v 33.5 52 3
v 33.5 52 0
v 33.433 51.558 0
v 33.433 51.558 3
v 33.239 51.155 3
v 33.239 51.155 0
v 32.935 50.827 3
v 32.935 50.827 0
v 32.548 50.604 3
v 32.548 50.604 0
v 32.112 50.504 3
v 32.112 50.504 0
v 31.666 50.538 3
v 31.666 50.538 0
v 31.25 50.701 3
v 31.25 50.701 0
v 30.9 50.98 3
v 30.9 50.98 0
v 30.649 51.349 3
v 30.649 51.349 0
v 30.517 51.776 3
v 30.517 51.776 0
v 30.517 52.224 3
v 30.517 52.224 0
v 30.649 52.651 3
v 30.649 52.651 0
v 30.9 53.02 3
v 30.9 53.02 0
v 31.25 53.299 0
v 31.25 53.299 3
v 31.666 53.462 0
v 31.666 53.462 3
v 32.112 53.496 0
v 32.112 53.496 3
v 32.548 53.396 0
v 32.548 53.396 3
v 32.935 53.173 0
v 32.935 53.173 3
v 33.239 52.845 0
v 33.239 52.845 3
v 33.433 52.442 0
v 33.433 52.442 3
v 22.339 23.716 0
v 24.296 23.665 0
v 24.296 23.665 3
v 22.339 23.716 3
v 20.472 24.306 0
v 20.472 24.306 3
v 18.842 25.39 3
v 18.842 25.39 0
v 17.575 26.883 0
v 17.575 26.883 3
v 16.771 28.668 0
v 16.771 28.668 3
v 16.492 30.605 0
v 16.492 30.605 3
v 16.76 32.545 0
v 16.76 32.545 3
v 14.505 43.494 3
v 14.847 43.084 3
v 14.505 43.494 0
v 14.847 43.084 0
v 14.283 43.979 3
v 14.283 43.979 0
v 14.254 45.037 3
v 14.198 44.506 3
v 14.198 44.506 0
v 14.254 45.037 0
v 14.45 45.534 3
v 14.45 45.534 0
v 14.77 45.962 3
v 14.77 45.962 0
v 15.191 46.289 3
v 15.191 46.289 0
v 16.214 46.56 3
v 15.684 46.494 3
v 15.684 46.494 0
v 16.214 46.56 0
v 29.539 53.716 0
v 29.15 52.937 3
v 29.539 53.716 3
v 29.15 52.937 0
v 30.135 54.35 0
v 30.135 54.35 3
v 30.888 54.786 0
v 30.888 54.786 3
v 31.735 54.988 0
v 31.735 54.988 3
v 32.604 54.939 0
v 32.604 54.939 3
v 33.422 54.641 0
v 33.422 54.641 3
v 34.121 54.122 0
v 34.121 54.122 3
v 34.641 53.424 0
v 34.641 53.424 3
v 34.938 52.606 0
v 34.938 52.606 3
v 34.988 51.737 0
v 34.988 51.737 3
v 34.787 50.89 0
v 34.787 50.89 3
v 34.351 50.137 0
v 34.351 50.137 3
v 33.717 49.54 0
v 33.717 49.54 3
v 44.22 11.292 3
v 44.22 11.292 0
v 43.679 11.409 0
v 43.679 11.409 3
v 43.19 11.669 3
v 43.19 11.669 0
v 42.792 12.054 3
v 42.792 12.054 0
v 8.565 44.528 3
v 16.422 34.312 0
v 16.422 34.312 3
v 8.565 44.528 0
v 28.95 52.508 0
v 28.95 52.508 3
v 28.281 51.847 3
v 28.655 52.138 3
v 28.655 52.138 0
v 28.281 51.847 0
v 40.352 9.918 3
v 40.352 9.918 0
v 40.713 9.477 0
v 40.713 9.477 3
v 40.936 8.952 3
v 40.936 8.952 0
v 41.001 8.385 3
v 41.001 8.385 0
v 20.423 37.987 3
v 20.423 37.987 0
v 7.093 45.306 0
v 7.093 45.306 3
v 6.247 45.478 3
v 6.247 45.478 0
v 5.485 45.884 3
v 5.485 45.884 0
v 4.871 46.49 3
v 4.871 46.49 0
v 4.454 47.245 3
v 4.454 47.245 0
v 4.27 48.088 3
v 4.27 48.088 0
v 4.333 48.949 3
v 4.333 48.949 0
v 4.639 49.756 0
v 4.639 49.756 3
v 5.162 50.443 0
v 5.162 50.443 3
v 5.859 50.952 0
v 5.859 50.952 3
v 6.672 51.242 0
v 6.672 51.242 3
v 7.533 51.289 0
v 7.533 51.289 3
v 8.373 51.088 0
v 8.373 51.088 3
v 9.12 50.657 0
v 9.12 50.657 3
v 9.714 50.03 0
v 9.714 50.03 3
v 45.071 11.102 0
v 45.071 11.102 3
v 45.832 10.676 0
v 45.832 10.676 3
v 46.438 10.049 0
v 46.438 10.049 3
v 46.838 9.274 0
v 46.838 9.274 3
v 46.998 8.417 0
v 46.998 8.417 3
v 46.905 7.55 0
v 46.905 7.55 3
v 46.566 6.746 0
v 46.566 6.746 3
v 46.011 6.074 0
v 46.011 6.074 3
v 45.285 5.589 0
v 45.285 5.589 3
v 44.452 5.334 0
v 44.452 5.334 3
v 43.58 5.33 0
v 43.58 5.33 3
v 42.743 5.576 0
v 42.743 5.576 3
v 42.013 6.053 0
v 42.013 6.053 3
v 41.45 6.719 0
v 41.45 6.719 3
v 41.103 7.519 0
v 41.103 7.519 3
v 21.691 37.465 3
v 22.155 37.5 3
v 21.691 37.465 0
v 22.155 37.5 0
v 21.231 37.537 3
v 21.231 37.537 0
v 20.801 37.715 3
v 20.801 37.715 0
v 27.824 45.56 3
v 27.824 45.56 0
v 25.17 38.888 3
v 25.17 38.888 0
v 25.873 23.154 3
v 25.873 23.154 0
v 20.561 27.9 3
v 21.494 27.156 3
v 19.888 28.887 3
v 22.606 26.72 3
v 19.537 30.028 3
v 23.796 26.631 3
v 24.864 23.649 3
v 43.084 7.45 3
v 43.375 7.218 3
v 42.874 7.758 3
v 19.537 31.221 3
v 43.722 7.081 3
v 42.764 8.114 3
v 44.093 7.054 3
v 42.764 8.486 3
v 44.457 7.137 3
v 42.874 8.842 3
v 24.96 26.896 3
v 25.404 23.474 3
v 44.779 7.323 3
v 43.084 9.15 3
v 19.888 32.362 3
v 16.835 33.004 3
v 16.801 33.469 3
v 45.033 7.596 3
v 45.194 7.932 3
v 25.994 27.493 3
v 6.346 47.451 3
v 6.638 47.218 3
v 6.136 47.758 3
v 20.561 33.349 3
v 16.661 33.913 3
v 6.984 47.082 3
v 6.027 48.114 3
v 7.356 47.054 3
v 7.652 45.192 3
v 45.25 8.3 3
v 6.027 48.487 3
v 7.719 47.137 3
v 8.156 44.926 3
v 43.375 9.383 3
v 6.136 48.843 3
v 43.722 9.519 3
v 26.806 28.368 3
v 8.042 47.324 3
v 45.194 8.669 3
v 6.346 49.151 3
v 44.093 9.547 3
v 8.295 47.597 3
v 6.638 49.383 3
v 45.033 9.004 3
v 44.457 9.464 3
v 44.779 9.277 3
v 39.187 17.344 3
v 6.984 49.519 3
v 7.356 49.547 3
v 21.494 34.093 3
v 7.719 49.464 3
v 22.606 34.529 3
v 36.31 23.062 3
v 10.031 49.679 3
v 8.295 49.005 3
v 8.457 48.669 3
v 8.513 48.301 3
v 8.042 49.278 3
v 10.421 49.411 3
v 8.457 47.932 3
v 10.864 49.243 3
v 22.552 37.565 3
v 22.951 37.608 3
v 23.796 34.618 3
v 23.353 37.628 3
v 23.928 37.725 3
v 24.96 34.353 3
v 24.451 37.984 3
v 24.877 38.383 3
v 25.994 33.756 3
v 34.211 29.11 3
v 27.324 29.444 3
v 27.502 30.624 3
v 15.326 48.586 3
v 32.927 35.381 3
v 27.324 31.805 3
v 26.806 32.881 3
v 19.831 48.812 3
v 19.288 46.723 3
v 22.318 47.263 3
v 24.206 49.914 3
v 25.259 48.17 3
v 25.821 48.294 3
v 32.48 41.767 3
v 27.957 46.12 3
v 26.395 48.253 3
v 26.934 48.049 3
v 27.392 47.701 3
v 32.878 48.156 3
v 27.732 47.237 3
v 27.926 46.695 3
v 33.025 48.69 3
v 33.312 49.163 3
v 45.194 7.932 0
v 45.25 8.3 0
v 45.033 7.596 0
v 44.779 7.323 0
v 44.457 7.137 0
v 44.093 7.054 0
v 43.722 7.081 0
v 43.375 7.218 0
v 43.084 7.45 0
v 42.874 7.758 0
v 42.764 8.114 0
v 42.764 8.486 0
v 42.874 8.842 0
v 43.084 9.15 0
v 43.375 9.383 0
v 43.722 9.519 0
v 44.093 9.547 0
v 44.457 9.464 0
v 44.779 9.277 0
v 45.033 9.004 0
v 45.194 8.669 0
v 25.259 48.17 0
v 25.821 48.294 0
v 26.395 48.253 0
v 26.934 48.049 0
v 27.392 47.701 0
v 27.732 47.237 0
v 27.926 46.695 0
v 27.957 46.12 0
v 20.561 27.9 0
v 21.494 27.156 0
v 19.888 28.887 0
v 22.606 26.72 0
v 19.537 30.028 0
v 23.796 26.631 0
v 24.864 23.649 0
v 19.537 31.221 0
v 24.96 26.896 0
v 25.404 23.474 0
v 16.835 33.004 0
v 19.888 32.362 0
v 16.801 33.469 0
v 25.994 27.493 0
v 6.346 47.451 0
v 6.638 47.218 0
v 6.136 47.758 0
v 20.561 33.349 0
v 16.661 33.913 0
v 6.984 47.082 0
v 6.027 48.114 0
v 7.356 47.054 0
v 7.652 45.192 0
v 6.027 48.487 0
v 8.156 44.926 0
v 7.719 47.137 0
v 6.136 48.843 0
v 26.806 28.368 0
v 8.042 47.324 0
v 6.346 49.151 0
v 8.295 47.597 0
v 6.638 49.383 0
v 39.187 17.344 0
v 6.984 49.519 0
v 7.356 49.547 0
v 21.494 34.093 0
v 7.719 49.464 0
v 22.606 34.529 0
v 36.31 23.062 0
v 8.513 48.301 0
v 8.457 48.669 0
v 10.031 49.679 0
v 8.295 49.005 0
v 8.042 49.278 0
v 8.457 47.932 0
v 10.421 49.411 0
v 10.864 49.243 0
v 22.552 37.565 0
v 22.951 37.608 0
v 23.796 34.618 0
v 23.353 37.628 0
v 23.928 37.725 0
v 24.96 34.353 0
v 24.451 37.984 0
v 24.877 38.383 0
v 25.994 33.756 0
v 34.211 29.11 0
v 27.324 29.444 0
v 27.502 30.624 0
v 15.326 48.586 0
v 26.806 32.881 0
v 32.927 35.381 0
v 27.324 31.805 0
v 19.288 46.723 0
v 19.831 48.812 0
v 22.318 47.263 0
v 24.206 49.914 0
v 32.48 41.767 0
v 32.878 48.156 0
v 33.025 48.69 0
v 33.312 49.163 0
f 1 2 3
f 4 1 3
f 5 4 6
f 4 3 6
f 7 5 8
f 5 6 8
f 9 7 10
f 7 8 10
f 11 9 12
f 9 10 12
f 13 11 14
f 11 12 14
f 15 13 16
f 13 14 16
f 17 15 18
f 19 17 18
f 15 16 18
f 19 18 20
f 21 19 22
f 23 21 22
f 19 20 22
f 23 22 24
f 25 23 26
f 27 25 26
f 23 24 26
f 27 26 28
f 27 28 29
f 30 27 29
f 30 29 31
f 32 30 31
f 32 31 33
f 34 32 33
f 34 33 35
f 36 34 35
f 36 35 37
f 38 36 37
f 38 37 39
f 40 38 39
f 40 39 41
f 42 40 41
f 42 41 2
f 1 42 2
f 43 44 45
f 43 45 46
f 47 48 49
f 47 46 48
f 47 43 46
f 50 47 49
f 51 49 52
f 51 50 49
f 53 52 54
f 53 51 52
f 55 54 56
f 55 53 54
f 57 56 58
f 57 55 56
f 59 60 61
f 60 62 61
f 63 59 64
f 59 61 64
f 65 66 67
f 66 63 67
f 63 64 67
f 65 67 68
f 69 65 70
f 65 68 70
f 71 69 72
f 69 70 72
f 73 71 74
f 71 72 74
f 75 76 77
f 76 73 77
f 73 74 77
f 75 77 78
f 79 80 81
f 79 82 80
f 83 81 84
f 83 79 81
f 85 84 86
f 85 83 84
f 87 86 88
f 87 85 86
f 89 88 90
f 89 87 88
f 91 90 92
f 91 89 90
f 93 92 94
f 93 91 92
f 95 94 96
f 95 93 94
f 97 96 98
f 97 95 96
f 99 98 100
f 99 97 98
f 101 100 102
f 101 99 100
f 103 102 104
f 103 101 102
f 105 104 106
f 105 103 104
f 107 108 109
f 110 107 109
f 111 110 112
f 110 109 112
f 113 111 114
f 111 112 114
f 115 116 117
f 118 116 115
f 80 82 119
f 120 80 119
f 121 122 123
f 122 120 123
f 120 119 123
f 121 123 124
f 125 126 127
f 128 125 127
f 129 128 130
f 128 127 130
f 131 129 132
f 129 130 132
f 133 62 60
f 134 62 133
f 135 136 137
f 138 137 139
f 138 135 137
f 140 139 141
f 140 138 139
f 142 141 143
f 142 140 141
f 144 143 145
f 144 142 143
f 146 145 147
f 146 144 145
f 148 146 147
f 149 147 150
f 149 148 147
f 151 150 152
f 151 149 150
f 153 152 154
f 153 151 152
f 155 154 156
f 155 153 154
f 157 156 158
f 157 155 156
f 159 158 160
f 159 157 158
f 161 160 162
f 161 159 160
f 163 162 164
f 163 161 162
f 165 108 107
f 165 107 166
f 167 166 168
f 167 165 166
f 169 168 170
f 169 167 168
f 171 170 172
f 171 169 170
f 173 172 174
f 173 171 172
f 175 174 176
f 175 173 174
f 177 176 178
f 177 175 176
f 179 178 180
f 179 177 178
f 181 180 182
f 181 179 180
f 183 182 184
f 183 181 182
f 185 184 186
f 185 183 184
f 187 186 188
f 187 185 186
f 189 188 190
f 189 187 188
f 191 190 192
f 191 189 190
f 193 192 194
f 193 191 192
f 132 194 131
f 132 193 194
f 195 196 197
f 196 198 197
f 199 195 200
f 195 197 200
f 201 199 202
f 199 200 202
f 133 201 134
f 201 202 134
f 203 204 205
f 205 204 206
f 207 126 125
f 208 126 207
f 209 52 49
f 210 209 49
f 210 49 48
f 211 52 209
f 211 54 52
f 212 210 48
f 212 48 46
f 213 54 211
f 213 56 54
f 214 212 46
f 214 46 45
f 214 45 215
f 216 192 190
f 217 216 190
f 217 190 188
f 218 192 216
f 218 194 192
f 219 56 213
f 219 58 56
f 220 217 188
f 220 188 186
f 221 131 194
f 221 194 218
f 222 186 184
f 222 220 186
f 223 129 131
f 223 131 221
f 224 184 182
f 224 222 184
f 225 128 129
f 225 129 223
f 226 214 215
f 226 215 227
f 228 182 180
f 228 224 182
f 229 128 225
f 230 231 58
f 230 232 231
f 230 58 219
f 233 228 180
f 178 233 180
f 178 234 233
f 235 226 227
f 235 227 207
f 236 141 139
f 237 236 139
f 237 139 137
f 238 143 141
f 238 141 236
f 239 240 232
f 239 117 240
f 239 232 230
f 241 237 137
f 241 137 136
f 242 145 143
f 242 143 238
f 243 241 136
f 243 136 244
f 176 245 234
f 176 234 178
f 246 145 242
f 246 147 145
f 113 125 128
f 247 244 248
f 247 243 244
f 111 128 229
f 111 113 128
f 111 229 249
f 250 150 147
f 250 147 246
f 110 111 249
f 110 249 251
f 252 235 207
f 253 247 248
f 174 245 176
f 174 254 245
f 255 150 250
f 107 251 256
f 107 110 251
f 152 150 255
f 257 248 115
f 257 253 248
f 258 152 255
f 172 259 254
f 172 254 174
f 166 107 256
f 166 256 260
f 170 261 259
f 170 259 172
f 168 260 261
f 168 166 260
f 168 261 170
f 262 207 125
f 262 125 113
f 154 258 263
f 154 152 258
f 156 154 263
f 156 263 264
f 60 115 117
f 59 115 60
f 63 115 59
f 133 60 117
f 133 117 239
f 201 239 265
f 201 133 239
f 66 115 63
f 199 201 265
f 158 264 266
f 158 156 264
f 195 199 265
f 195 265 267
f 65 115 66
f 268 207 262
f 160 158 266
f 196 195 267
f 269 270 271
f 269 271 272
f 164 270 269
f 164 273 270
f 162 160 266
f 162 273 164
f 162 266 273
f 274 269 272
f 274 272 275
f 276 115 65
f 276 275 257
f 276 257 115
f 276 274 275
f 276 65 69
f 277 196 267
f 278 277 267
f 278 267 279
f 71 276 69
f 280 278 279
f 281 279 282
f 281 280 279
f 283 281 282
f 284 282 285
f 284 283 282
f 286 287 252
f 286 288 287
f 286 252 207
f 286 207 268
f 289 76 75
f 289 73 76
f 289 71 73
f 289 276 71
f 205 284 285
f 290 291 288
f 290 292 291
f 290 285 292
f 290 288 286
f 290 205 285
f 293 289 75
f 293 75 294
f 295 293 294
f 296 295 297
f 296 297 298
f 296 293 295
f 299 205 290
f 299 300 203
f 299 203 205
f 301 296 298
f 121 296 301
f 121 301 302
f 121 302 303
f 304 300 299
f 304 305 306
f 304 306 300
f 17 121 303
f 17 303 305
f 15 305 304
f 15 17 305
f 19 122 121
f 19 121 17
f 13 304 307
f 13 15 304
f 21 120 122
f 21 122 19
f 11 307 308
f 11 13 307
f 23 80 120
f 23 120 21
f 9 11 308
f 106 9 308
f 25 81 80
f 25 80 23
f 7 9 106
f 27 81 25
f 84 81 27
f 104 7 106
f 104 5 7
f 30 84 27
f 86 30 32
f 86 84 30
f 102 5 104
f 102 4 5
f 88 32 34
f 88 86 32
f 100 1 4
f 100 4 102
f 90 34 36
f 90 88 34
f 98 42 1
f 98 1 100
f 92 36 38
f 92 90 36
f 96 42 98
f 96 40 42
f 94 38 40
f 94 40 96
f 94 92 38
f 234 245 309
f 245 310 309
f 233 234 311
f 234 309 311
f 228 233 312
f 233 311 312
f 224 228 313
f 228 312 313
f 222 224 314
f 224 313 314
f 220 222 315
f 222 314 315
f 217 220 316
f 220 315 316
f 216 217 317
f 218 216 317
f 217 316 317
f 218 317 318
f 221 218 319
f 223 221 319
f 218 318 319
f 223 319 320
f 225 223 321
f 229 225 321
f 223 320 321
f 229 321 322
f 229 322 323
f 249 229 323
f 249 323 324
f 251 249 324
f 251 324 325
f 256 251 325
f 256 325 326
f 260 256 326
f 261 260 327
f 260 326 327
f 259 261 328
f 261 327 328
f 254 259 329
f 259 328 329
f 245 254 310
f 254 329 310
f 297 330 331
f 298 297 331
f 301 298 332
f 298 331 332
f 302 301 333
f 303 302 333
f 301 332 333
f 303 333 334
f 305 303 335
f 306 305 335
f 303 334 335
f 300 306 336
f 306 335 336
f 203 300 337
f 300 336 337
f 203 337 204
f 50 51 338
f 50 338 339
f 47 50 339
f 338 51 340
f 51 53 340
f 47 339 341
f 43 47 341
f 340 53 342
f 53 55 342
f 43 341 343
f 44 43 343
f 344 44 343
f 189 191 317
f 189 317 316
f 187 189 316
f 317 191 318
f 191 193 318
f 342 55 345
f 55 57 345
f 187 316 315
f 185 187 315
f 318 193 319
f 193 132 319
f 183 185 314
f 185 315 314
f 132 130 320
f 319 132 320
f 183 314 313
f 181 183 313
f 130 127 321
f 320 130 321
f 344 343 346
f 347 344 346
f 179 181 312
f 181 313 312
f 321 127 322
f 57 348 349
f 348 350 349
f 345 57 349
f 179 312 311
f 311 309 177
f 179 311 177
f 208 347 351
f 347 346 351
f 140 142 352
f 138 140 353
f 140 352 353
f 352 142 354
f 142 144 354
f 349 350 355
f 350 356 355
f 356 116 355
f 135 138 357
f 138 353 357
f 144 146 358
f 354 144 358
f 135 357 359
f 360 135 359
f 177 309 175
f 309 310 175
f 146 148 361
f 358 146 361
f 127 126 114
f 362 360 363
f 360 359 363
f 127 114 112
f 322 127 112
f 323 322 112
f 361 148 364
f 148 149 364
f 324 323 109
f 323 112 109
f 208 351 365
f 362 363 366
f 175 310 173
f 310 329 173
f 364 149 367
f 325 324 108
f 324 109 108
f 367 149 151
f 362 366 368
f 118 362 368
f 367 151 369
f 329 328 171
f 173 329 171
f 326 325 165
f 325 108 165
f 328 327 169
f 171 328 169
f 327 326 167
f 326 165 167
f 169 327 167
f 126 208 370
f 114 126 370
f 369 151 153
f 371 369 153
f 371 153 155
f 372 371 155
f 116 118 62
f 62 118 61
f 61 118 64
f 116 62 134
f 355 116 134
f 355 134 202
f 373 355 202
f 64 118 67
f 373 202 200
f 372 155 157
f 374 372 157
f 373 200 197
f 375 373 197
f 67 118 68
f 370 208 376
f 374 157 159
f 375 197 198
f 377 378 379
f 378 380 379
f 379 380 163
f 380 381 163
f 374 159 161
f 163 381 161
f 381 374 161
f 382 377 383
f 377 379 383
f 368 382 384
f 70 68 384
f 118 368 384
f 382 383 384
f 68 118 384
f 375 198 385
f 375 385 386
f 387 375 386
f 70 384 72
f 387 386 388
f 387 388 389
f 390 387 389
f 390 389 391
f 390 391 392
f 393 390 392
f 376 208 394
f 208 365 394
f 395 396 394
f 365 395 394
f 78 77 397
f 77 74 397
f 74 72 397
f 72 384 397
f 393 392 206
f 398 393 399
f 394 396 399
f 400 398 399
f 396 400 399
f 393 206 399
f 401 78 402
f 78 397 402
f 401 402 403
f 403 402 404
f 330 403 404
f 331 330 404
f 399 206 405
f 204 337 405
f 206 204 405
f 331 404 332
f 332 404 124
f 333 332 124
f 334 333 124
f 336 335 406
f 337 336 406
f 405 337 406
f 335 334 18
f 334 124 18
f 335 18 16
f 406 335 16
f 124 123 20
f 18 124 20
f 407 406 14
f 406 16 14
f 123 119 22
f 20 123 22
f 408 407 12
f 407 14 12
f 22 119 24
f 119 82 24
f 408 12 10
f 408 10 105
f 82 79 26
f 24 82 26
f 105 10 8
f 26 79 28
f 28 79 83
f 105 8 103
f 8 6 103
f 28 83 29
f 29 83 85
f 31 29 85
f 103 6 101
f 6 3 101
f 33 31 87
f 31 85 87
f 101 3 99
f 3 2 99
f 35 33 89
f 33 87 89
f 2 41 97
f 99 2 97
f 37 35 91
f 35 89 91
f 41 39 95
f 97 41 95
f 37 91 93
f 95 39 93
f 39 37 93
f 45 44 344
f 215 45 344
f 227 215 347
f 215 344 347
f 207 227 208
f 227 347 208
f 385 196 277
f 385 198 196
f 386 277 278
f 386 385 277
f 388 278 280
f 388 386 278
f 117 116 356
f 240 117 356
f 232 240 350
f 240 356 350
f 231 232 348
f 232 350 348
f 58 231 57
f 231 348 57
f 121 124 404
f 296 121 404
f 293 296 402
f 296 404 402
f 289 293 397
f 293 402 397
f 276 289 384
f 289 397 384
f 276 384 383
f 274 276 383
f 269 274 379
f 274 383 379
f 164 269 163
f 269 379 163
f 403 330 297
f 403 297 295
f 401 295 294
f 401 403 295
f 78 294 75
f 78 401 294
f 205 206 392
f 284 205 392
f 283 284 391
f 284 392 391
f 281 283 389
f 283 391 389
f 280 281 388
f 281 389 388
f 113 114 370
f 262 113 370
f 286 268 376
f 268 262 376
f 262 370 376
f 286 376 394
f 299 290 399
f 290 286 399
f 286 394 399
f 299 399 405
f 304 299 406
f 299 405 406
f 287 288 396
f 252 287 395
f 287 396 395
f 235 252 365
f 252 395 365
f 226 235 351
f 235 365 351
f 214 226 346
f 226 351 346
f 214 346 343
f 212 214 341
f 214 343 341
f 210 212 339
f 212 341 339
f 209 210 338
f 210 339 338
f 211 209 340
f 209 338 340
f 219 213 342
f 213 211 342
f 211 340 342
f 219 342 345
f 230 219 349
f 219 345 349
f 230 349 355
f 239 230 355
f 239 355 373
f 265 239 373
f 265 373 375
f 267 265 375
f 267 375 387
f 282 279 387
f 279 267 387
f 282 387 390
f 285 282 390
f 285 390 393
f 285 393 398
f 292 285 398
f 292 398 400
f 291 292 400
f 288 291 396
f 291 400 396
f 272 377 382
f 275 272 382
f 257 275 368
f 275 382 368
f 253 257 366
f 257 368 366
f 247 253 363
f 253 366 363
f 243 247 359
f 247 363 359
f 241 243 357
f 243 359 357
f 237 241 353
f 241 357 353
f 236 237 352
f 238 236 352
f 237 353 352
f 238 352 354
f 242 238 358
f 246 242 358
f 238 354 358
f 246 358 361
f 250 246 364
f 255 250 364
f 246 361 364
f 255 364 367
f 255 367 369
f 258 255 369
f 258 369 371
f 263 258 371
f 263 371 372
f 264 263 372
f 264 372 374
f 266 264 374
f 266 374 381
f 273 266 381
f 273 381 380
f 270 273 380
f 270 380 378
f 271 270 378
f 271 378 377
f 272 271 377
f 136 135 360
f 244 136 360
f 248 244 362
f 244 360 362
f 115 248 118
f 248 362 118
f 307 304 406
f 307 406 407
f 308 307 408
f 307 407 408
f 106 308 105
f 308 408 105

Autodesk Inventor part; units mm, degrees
ref_plane "YZ Plane" through (0, 0, 0) normal (1, 0, 0) x (0, 1, 0)
ref_plane "XZ Plane" through (0, 0, 0) normal (0, 1, 0) x (-1, 0, 0)
ref_plane "XY Plane" through (0, 0, 0) normal (0, 0, 1) x (1, 0, 0)
sketch "スケッチ1" plane through (0, 0, 0) normal (0, 0, 1) x (1, 0, 0)
  circle A0 centre (7.2626, 48.3008) radius 1.25
  circle A1 centre (23.4968, 30.6245) radius 4.005
  circle A2 centre (44, 8.3001) radius 1.25
  line L0 (10.1247, 47.4019) -> (21.2271, 37.2516)
  line L1 (17.0863, 33.4486) -> (7.9152, 45.3726)
  circle A3 centre (23.4968, 30.6245) radius 7.005
  line L2 (41.1378, 9.199) -> (25.1486, 23.817)
  line L3 (30.1394, 28.4007) -> (43.3474, 11.2282)
  circle A4 centre (7.2626, 48.3008) radius 3
  circle A5 centre (44, 8.3001) radius 3
  circle A6 centre (32, 52) radius 1.5
  circle A7 centre (32, 52) radius 3
  line L4 (32, 52) -> (23.4968, 30.6245)
  arc A8 (32, 52) -> (44, 8.3001) centre (80.98, 41.9524) ccw
  arc A9 (7.2626, 48.3008) -> (32, 52) centre (16.4298, 71.5594) ccw
  arc A10 (4.6243, 51.8203) -> (33.4933, 56.1374) centre (16.4298, 71.5594) ccw
  arc A11 (33.2535, 50.5793) -> (44.802, 9.6507) centre (80.98, 41.9524) ccw
  line L5 (33.3938, 51.4456) -> (24.8906, 30.0701)
  line L6 (30.6062, 52.5544) -> (22.103, 31.179)
  point P0 (0, 0)
  point P1 (0, 0)
  point P2 (43.4377, 11.2469)
  point P3 (33.0215, 49.1793)
  point P4 (29.0159, 52.3087)
  point P5 (10.0258, 49.4689)
  point P6 (10.1773, 47.3539)
  point P7 (29.545, 50.2758)
  point P8 (29.6459, 50.1404)
  point P9 (24.6322, 37.5369)
  point P10 (10.1146, 47.3701)
  point P11 (35.2275, 21.7854)
  point P12 (27.4198, 36.428)
  point P13 (31.1236, 45.7388)
  dimension "d0" = 2
  dimension "d1" = 1.5
  dimension "d2" = 1.5
  dimension "d3" = 1.5
  dimension "d4" = 25
  dimension "d5" = 50
extrude "押し出し1" add sketch "スケッチ1" along normal blind 3 contours A1 L5 A3 L6 | A1 L4 A3 L5 | L6 A3 L4 A1 | L5 A8 L3 A3 | A3 L4 A7 A8 L5 | L6 A7 L4 A3 | L5 A7 A11 A5 L3 A8 | A8 A7 L5 | A3 L1 A4 A9 L0 | L6 A9 A6 L4 A7 | A7 A9 L6 | L4 A6 A8 A7 | L3 A8 A5 L2 A3 | A8 A6 L5 A7 | L3 A5 A8 | L5 A6 L6 A9 A7 A10 | A9 A4 L0 | L0 A4 A10 A7 A9 | L6 A6 A9 | A5 | A4 A10 | A7 A10 | A4 A10
fillet "フィレット1" radius 2 13 edges at (10.1773, 47.3539, 1.5) (10.0258, 49.4689, 1.5) (7.9152, 45.3726, 1.5) (29.0159, 52.3087, 1.5) (29.6459, 50.1404, 1.5) (29.545, 50.2758, 1.5) (33.0215, 49.1793, 1.5) (21.2271, 37.2516, 1.5) (24.6322, 37.5369, 1.5) (17.0863, 33.4486, 1.5) (25.1486, 23.817, 1.5) (43.4377, 11.2469, 1.5) (41.1378, 9.199, 1.5)
properties part number "脚ギアマウントv3" material "アルミニウム 2014-T4"
